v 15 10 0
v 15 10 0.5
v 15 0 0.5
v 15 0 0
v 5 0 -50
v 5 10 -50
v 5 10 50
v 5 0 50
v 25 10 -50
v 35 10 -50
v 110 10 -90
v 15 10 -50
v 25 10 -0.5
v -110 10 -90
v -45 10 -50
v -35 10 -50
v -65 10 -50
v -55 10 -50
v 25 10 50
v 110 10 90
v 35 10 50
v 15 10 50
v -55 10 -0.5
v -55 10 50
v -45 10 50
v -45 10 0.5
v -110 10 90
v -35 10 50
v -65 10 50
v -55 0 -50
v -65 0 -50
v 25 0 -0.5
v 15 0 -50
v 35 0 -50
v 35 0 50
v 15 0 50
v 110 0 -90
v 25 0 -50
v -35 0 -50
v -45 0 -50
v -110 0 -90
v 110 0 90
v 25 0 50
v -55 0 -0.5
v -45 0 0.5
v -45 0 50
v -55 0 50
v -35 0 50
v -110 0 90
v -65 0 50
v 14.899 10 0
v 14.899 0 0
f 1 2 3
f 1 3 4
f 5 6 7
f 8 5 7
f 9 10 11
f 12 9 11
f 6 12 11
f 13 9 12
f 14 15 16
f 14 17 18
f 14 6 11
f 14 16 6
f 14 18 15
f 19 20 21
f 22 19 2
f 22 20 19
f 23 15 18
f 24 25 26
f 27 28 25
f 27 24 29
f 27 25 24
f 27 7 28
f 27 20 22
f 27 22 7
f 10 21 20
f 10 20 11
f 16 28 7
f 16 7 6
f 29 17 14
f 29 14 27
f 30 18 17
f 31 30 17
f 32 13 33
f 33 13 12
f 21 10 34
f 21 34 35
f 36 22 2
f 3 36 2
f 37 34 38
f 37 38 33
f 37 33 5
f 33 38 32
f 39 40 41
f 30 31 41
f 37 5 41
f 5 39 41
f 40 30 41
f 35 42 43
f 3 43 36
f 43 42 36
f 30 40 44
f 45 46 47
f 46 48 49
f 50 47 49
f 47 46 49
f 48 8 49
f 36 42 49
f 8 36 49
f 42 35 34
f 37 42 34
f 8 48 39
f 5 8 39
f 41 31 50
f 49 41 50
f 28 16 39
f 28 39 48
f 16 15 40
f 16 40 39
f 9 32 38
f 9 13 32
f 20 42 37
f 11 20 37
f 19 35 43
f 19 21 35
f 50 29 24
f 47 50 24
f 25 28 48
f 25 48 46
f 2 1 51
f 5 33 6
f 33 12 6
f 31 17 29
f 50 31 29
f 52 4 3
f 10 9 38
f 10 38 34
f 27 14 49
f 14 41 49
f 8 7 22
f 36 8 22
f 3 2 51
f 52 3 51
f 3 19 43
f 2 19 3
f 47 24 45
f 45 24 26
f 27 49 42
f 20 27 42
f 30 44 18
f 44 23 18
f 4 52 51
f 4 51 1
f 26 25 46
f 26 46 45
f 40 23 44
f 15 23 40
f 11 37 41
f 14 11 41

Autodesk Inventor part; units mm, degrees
ref_plane "YZ Plane" through (0, 0, 0) normal (1, 0, 0) x (0, 1, 0)
ref_plane "XZ Plane" through (0, 0, 0) normal (0, 1, 0) x (-1, 0, 0)
ref_plane "XY Plane" through (0, 0, 0) normal (0, 0, 1) x (1, 0, 0)
sketch "Boceto1" plane through (0, 0, 0) normal (0, 1, 0) x (-1, 0, 0)
  point P0 (0, 0)
sketch "Boceto2" plane through (0, 0, 0) normal (0, 1, 0) x (-1, 0, 0)
  line L0 (110, 90) -> (-110, 90)
  line L1 (-110, 90) -> (-110, -90)
  line L2 (-110, -90) -> (110, -90)
  line L3 (110, -90) -> (110, 90)
  line L4 (110, 90) -> (-110, -90) construction
  line L5 (-110, 90) -> (110, -90) construction
  point P0 (0, 0)
  dimension "d0" = 220
  dimension "d1" = 180
extrude "Extrusión1" add sketch "Boceto2" along normal blind 10
sketch "Boceto3" plane through (0, 10, 0) normal (0, 1, 0) x (1, 0, 0)
  point P0 (0, 0)
sketch "Boceto4" plane through (0, 10, 0) normal (0, 1, 0) x (1, 0, 0)
  line L0 (-110, 90) -> (-110, -90) projected
  line L1 (-110, 0) -> (-60, 0)
  line L2 (-110, 0) -> (-60, 0) construction
  line L3 (-65, -50) -> (-55, -50)
  line L4 (-55, -50) -> (-55, 50)
  line L5 (-55, 50) -> (-65, 50)
  line L6 (-65, 50) -> (-65, -50)
  line L7 (-65, -50) -> (-55, 50) construction
  line L8 (-55, -50) -> (-65, 50) construction
  line L9 (-55, -50) -> (-64.802, -48.0198)
  line L10 (-55, -50) -> (-45, -50) construction
  line L11 (-64.802, -48.0198) -> (-45, 50)
  line L12 (-55, -50) -> (-35.198, 48.0198)
  line L13 (-35.198, 48.0198) -> (-45, 50)
  line L14 (-55, 50) -> (-49.1181, 50)
  line L15 (-45, 50) -> (-35, 50)
  line L16 (-35, 50) -> (-35, -50)
  line L17 (-35, -50) -> (-45, -50)
  line L18 (-45, -50) -> (-45, 50)
  line L19 (-35, 0) -> (-15, 0)
  line L20 (-15, 0) -> (-15, -90)
  line L21 (35, -50) -> (25, -50)
  line L22 (25, -50) -> (25, 50)
  line L23 (25, 50) -> (35, 50)
  line L24 (35, 50) -> (35, -50)
  line L25 (35, -50) -> (25, 50) construction
  line L26 (25, -50) -> (35, 50) construction
  line L27 (25, -50) -> (34.802, -48.0198)
  line L28 (25, -50) -> (15, -50) construction
  line L29 (34.802, -48.0198) -> (15, 50)
  line L30 (25, -50) -> (5.198, 48.0198)
  line L31 (5.198, 48.0198) -> (15, 50)
  line L32 (25, 50) -> (19.1181, 50)
  line L33 (15, 50) -> (5, 50)
  line L34 (5, 50) -> (5, -50)
  line L35 (5, -50) -> (15, -50)
  line L36 (15, -50) -> (15, 50)
  line L37 (0, 0) -> (20, 0)
  line L38 (-110, -90) -> (110, -90) projected
  point P0 (30, 0)
  point P1 (30, 0)
  point P2 (5, 0)
  point P3 (15, -0.5)
  point P4 (25, 0.5)
  point P5 (-30, 50)
  point P6 (-55, 0.5)
  point P7 (-45, -0.5)
  point P8 (-70, 50)
  point P9 (-0.8819, 50)
  point P10 (15.101, 0)
  point P11 (15, 0)
  point P12 (14.899, 0)
  point P13 (15, 0)
  dimension "d4" = 50
  dimension "d5" = 0
  dimension "d6" = 10
  dimension "d7" = 100
  dimension "d8" = 10
  dimension "d10" = 100
  dimension "d11" = 100
  dimension "d12" = 10
  dimension "d13" = 100
  dimension "d14" = 20
  dimension "d15" = 20
extrude "Extrusión2" cut sketch "Boceto4" against normal up to surface (10 mm away) contours L6 L5 L4 L11 L9 L3 | L9 L11 L4 | L4 L11 L18 L12 | L16 L17 L18 L12 L13 L15 | L18 L13 L12 | L21 L27 L29 L22 L23 L24 | L30 L36 L29 L22 | L22 L29 L27 | L36 L35 L34 L37 L30 | L36 L37 L30 L31 | L31 L30 L37 L34 L33
equation "\"d0\" = alto_t"
equation "\"d1\" = ancho_t"
equation "\"d2\" = grueso_t"
equation "\"d4\" = d_ranura"
equation "\"d6\" = alto_p"
equation "\"d7\" = ancho_p"
equation "\"d8\" = alto_p"
equation "\"d10\" = ancho_p"
equation "\"d11\" = ancho_p"
equation "\"d12\" = alto_p"
equation "\"d13\" = ancho_p"
equation "\"d14\" = d_sim"
equation "\"d15\" = d_sim"
equation "\"ancho_t\" = 180"
equation "\"alto_t\" = 220"
equation "\"grueso_t\" = 10"
equation "\"d_ranura\" = 50"
equation "\"ancho_p\" = 100"
equation "\"alto_p\" = 10"
equation "\"angulo_p\" = 165deg"
equation "\"d_sim\" = 20"
properties part number "Parte A-B" material "Madera (abedul)"
